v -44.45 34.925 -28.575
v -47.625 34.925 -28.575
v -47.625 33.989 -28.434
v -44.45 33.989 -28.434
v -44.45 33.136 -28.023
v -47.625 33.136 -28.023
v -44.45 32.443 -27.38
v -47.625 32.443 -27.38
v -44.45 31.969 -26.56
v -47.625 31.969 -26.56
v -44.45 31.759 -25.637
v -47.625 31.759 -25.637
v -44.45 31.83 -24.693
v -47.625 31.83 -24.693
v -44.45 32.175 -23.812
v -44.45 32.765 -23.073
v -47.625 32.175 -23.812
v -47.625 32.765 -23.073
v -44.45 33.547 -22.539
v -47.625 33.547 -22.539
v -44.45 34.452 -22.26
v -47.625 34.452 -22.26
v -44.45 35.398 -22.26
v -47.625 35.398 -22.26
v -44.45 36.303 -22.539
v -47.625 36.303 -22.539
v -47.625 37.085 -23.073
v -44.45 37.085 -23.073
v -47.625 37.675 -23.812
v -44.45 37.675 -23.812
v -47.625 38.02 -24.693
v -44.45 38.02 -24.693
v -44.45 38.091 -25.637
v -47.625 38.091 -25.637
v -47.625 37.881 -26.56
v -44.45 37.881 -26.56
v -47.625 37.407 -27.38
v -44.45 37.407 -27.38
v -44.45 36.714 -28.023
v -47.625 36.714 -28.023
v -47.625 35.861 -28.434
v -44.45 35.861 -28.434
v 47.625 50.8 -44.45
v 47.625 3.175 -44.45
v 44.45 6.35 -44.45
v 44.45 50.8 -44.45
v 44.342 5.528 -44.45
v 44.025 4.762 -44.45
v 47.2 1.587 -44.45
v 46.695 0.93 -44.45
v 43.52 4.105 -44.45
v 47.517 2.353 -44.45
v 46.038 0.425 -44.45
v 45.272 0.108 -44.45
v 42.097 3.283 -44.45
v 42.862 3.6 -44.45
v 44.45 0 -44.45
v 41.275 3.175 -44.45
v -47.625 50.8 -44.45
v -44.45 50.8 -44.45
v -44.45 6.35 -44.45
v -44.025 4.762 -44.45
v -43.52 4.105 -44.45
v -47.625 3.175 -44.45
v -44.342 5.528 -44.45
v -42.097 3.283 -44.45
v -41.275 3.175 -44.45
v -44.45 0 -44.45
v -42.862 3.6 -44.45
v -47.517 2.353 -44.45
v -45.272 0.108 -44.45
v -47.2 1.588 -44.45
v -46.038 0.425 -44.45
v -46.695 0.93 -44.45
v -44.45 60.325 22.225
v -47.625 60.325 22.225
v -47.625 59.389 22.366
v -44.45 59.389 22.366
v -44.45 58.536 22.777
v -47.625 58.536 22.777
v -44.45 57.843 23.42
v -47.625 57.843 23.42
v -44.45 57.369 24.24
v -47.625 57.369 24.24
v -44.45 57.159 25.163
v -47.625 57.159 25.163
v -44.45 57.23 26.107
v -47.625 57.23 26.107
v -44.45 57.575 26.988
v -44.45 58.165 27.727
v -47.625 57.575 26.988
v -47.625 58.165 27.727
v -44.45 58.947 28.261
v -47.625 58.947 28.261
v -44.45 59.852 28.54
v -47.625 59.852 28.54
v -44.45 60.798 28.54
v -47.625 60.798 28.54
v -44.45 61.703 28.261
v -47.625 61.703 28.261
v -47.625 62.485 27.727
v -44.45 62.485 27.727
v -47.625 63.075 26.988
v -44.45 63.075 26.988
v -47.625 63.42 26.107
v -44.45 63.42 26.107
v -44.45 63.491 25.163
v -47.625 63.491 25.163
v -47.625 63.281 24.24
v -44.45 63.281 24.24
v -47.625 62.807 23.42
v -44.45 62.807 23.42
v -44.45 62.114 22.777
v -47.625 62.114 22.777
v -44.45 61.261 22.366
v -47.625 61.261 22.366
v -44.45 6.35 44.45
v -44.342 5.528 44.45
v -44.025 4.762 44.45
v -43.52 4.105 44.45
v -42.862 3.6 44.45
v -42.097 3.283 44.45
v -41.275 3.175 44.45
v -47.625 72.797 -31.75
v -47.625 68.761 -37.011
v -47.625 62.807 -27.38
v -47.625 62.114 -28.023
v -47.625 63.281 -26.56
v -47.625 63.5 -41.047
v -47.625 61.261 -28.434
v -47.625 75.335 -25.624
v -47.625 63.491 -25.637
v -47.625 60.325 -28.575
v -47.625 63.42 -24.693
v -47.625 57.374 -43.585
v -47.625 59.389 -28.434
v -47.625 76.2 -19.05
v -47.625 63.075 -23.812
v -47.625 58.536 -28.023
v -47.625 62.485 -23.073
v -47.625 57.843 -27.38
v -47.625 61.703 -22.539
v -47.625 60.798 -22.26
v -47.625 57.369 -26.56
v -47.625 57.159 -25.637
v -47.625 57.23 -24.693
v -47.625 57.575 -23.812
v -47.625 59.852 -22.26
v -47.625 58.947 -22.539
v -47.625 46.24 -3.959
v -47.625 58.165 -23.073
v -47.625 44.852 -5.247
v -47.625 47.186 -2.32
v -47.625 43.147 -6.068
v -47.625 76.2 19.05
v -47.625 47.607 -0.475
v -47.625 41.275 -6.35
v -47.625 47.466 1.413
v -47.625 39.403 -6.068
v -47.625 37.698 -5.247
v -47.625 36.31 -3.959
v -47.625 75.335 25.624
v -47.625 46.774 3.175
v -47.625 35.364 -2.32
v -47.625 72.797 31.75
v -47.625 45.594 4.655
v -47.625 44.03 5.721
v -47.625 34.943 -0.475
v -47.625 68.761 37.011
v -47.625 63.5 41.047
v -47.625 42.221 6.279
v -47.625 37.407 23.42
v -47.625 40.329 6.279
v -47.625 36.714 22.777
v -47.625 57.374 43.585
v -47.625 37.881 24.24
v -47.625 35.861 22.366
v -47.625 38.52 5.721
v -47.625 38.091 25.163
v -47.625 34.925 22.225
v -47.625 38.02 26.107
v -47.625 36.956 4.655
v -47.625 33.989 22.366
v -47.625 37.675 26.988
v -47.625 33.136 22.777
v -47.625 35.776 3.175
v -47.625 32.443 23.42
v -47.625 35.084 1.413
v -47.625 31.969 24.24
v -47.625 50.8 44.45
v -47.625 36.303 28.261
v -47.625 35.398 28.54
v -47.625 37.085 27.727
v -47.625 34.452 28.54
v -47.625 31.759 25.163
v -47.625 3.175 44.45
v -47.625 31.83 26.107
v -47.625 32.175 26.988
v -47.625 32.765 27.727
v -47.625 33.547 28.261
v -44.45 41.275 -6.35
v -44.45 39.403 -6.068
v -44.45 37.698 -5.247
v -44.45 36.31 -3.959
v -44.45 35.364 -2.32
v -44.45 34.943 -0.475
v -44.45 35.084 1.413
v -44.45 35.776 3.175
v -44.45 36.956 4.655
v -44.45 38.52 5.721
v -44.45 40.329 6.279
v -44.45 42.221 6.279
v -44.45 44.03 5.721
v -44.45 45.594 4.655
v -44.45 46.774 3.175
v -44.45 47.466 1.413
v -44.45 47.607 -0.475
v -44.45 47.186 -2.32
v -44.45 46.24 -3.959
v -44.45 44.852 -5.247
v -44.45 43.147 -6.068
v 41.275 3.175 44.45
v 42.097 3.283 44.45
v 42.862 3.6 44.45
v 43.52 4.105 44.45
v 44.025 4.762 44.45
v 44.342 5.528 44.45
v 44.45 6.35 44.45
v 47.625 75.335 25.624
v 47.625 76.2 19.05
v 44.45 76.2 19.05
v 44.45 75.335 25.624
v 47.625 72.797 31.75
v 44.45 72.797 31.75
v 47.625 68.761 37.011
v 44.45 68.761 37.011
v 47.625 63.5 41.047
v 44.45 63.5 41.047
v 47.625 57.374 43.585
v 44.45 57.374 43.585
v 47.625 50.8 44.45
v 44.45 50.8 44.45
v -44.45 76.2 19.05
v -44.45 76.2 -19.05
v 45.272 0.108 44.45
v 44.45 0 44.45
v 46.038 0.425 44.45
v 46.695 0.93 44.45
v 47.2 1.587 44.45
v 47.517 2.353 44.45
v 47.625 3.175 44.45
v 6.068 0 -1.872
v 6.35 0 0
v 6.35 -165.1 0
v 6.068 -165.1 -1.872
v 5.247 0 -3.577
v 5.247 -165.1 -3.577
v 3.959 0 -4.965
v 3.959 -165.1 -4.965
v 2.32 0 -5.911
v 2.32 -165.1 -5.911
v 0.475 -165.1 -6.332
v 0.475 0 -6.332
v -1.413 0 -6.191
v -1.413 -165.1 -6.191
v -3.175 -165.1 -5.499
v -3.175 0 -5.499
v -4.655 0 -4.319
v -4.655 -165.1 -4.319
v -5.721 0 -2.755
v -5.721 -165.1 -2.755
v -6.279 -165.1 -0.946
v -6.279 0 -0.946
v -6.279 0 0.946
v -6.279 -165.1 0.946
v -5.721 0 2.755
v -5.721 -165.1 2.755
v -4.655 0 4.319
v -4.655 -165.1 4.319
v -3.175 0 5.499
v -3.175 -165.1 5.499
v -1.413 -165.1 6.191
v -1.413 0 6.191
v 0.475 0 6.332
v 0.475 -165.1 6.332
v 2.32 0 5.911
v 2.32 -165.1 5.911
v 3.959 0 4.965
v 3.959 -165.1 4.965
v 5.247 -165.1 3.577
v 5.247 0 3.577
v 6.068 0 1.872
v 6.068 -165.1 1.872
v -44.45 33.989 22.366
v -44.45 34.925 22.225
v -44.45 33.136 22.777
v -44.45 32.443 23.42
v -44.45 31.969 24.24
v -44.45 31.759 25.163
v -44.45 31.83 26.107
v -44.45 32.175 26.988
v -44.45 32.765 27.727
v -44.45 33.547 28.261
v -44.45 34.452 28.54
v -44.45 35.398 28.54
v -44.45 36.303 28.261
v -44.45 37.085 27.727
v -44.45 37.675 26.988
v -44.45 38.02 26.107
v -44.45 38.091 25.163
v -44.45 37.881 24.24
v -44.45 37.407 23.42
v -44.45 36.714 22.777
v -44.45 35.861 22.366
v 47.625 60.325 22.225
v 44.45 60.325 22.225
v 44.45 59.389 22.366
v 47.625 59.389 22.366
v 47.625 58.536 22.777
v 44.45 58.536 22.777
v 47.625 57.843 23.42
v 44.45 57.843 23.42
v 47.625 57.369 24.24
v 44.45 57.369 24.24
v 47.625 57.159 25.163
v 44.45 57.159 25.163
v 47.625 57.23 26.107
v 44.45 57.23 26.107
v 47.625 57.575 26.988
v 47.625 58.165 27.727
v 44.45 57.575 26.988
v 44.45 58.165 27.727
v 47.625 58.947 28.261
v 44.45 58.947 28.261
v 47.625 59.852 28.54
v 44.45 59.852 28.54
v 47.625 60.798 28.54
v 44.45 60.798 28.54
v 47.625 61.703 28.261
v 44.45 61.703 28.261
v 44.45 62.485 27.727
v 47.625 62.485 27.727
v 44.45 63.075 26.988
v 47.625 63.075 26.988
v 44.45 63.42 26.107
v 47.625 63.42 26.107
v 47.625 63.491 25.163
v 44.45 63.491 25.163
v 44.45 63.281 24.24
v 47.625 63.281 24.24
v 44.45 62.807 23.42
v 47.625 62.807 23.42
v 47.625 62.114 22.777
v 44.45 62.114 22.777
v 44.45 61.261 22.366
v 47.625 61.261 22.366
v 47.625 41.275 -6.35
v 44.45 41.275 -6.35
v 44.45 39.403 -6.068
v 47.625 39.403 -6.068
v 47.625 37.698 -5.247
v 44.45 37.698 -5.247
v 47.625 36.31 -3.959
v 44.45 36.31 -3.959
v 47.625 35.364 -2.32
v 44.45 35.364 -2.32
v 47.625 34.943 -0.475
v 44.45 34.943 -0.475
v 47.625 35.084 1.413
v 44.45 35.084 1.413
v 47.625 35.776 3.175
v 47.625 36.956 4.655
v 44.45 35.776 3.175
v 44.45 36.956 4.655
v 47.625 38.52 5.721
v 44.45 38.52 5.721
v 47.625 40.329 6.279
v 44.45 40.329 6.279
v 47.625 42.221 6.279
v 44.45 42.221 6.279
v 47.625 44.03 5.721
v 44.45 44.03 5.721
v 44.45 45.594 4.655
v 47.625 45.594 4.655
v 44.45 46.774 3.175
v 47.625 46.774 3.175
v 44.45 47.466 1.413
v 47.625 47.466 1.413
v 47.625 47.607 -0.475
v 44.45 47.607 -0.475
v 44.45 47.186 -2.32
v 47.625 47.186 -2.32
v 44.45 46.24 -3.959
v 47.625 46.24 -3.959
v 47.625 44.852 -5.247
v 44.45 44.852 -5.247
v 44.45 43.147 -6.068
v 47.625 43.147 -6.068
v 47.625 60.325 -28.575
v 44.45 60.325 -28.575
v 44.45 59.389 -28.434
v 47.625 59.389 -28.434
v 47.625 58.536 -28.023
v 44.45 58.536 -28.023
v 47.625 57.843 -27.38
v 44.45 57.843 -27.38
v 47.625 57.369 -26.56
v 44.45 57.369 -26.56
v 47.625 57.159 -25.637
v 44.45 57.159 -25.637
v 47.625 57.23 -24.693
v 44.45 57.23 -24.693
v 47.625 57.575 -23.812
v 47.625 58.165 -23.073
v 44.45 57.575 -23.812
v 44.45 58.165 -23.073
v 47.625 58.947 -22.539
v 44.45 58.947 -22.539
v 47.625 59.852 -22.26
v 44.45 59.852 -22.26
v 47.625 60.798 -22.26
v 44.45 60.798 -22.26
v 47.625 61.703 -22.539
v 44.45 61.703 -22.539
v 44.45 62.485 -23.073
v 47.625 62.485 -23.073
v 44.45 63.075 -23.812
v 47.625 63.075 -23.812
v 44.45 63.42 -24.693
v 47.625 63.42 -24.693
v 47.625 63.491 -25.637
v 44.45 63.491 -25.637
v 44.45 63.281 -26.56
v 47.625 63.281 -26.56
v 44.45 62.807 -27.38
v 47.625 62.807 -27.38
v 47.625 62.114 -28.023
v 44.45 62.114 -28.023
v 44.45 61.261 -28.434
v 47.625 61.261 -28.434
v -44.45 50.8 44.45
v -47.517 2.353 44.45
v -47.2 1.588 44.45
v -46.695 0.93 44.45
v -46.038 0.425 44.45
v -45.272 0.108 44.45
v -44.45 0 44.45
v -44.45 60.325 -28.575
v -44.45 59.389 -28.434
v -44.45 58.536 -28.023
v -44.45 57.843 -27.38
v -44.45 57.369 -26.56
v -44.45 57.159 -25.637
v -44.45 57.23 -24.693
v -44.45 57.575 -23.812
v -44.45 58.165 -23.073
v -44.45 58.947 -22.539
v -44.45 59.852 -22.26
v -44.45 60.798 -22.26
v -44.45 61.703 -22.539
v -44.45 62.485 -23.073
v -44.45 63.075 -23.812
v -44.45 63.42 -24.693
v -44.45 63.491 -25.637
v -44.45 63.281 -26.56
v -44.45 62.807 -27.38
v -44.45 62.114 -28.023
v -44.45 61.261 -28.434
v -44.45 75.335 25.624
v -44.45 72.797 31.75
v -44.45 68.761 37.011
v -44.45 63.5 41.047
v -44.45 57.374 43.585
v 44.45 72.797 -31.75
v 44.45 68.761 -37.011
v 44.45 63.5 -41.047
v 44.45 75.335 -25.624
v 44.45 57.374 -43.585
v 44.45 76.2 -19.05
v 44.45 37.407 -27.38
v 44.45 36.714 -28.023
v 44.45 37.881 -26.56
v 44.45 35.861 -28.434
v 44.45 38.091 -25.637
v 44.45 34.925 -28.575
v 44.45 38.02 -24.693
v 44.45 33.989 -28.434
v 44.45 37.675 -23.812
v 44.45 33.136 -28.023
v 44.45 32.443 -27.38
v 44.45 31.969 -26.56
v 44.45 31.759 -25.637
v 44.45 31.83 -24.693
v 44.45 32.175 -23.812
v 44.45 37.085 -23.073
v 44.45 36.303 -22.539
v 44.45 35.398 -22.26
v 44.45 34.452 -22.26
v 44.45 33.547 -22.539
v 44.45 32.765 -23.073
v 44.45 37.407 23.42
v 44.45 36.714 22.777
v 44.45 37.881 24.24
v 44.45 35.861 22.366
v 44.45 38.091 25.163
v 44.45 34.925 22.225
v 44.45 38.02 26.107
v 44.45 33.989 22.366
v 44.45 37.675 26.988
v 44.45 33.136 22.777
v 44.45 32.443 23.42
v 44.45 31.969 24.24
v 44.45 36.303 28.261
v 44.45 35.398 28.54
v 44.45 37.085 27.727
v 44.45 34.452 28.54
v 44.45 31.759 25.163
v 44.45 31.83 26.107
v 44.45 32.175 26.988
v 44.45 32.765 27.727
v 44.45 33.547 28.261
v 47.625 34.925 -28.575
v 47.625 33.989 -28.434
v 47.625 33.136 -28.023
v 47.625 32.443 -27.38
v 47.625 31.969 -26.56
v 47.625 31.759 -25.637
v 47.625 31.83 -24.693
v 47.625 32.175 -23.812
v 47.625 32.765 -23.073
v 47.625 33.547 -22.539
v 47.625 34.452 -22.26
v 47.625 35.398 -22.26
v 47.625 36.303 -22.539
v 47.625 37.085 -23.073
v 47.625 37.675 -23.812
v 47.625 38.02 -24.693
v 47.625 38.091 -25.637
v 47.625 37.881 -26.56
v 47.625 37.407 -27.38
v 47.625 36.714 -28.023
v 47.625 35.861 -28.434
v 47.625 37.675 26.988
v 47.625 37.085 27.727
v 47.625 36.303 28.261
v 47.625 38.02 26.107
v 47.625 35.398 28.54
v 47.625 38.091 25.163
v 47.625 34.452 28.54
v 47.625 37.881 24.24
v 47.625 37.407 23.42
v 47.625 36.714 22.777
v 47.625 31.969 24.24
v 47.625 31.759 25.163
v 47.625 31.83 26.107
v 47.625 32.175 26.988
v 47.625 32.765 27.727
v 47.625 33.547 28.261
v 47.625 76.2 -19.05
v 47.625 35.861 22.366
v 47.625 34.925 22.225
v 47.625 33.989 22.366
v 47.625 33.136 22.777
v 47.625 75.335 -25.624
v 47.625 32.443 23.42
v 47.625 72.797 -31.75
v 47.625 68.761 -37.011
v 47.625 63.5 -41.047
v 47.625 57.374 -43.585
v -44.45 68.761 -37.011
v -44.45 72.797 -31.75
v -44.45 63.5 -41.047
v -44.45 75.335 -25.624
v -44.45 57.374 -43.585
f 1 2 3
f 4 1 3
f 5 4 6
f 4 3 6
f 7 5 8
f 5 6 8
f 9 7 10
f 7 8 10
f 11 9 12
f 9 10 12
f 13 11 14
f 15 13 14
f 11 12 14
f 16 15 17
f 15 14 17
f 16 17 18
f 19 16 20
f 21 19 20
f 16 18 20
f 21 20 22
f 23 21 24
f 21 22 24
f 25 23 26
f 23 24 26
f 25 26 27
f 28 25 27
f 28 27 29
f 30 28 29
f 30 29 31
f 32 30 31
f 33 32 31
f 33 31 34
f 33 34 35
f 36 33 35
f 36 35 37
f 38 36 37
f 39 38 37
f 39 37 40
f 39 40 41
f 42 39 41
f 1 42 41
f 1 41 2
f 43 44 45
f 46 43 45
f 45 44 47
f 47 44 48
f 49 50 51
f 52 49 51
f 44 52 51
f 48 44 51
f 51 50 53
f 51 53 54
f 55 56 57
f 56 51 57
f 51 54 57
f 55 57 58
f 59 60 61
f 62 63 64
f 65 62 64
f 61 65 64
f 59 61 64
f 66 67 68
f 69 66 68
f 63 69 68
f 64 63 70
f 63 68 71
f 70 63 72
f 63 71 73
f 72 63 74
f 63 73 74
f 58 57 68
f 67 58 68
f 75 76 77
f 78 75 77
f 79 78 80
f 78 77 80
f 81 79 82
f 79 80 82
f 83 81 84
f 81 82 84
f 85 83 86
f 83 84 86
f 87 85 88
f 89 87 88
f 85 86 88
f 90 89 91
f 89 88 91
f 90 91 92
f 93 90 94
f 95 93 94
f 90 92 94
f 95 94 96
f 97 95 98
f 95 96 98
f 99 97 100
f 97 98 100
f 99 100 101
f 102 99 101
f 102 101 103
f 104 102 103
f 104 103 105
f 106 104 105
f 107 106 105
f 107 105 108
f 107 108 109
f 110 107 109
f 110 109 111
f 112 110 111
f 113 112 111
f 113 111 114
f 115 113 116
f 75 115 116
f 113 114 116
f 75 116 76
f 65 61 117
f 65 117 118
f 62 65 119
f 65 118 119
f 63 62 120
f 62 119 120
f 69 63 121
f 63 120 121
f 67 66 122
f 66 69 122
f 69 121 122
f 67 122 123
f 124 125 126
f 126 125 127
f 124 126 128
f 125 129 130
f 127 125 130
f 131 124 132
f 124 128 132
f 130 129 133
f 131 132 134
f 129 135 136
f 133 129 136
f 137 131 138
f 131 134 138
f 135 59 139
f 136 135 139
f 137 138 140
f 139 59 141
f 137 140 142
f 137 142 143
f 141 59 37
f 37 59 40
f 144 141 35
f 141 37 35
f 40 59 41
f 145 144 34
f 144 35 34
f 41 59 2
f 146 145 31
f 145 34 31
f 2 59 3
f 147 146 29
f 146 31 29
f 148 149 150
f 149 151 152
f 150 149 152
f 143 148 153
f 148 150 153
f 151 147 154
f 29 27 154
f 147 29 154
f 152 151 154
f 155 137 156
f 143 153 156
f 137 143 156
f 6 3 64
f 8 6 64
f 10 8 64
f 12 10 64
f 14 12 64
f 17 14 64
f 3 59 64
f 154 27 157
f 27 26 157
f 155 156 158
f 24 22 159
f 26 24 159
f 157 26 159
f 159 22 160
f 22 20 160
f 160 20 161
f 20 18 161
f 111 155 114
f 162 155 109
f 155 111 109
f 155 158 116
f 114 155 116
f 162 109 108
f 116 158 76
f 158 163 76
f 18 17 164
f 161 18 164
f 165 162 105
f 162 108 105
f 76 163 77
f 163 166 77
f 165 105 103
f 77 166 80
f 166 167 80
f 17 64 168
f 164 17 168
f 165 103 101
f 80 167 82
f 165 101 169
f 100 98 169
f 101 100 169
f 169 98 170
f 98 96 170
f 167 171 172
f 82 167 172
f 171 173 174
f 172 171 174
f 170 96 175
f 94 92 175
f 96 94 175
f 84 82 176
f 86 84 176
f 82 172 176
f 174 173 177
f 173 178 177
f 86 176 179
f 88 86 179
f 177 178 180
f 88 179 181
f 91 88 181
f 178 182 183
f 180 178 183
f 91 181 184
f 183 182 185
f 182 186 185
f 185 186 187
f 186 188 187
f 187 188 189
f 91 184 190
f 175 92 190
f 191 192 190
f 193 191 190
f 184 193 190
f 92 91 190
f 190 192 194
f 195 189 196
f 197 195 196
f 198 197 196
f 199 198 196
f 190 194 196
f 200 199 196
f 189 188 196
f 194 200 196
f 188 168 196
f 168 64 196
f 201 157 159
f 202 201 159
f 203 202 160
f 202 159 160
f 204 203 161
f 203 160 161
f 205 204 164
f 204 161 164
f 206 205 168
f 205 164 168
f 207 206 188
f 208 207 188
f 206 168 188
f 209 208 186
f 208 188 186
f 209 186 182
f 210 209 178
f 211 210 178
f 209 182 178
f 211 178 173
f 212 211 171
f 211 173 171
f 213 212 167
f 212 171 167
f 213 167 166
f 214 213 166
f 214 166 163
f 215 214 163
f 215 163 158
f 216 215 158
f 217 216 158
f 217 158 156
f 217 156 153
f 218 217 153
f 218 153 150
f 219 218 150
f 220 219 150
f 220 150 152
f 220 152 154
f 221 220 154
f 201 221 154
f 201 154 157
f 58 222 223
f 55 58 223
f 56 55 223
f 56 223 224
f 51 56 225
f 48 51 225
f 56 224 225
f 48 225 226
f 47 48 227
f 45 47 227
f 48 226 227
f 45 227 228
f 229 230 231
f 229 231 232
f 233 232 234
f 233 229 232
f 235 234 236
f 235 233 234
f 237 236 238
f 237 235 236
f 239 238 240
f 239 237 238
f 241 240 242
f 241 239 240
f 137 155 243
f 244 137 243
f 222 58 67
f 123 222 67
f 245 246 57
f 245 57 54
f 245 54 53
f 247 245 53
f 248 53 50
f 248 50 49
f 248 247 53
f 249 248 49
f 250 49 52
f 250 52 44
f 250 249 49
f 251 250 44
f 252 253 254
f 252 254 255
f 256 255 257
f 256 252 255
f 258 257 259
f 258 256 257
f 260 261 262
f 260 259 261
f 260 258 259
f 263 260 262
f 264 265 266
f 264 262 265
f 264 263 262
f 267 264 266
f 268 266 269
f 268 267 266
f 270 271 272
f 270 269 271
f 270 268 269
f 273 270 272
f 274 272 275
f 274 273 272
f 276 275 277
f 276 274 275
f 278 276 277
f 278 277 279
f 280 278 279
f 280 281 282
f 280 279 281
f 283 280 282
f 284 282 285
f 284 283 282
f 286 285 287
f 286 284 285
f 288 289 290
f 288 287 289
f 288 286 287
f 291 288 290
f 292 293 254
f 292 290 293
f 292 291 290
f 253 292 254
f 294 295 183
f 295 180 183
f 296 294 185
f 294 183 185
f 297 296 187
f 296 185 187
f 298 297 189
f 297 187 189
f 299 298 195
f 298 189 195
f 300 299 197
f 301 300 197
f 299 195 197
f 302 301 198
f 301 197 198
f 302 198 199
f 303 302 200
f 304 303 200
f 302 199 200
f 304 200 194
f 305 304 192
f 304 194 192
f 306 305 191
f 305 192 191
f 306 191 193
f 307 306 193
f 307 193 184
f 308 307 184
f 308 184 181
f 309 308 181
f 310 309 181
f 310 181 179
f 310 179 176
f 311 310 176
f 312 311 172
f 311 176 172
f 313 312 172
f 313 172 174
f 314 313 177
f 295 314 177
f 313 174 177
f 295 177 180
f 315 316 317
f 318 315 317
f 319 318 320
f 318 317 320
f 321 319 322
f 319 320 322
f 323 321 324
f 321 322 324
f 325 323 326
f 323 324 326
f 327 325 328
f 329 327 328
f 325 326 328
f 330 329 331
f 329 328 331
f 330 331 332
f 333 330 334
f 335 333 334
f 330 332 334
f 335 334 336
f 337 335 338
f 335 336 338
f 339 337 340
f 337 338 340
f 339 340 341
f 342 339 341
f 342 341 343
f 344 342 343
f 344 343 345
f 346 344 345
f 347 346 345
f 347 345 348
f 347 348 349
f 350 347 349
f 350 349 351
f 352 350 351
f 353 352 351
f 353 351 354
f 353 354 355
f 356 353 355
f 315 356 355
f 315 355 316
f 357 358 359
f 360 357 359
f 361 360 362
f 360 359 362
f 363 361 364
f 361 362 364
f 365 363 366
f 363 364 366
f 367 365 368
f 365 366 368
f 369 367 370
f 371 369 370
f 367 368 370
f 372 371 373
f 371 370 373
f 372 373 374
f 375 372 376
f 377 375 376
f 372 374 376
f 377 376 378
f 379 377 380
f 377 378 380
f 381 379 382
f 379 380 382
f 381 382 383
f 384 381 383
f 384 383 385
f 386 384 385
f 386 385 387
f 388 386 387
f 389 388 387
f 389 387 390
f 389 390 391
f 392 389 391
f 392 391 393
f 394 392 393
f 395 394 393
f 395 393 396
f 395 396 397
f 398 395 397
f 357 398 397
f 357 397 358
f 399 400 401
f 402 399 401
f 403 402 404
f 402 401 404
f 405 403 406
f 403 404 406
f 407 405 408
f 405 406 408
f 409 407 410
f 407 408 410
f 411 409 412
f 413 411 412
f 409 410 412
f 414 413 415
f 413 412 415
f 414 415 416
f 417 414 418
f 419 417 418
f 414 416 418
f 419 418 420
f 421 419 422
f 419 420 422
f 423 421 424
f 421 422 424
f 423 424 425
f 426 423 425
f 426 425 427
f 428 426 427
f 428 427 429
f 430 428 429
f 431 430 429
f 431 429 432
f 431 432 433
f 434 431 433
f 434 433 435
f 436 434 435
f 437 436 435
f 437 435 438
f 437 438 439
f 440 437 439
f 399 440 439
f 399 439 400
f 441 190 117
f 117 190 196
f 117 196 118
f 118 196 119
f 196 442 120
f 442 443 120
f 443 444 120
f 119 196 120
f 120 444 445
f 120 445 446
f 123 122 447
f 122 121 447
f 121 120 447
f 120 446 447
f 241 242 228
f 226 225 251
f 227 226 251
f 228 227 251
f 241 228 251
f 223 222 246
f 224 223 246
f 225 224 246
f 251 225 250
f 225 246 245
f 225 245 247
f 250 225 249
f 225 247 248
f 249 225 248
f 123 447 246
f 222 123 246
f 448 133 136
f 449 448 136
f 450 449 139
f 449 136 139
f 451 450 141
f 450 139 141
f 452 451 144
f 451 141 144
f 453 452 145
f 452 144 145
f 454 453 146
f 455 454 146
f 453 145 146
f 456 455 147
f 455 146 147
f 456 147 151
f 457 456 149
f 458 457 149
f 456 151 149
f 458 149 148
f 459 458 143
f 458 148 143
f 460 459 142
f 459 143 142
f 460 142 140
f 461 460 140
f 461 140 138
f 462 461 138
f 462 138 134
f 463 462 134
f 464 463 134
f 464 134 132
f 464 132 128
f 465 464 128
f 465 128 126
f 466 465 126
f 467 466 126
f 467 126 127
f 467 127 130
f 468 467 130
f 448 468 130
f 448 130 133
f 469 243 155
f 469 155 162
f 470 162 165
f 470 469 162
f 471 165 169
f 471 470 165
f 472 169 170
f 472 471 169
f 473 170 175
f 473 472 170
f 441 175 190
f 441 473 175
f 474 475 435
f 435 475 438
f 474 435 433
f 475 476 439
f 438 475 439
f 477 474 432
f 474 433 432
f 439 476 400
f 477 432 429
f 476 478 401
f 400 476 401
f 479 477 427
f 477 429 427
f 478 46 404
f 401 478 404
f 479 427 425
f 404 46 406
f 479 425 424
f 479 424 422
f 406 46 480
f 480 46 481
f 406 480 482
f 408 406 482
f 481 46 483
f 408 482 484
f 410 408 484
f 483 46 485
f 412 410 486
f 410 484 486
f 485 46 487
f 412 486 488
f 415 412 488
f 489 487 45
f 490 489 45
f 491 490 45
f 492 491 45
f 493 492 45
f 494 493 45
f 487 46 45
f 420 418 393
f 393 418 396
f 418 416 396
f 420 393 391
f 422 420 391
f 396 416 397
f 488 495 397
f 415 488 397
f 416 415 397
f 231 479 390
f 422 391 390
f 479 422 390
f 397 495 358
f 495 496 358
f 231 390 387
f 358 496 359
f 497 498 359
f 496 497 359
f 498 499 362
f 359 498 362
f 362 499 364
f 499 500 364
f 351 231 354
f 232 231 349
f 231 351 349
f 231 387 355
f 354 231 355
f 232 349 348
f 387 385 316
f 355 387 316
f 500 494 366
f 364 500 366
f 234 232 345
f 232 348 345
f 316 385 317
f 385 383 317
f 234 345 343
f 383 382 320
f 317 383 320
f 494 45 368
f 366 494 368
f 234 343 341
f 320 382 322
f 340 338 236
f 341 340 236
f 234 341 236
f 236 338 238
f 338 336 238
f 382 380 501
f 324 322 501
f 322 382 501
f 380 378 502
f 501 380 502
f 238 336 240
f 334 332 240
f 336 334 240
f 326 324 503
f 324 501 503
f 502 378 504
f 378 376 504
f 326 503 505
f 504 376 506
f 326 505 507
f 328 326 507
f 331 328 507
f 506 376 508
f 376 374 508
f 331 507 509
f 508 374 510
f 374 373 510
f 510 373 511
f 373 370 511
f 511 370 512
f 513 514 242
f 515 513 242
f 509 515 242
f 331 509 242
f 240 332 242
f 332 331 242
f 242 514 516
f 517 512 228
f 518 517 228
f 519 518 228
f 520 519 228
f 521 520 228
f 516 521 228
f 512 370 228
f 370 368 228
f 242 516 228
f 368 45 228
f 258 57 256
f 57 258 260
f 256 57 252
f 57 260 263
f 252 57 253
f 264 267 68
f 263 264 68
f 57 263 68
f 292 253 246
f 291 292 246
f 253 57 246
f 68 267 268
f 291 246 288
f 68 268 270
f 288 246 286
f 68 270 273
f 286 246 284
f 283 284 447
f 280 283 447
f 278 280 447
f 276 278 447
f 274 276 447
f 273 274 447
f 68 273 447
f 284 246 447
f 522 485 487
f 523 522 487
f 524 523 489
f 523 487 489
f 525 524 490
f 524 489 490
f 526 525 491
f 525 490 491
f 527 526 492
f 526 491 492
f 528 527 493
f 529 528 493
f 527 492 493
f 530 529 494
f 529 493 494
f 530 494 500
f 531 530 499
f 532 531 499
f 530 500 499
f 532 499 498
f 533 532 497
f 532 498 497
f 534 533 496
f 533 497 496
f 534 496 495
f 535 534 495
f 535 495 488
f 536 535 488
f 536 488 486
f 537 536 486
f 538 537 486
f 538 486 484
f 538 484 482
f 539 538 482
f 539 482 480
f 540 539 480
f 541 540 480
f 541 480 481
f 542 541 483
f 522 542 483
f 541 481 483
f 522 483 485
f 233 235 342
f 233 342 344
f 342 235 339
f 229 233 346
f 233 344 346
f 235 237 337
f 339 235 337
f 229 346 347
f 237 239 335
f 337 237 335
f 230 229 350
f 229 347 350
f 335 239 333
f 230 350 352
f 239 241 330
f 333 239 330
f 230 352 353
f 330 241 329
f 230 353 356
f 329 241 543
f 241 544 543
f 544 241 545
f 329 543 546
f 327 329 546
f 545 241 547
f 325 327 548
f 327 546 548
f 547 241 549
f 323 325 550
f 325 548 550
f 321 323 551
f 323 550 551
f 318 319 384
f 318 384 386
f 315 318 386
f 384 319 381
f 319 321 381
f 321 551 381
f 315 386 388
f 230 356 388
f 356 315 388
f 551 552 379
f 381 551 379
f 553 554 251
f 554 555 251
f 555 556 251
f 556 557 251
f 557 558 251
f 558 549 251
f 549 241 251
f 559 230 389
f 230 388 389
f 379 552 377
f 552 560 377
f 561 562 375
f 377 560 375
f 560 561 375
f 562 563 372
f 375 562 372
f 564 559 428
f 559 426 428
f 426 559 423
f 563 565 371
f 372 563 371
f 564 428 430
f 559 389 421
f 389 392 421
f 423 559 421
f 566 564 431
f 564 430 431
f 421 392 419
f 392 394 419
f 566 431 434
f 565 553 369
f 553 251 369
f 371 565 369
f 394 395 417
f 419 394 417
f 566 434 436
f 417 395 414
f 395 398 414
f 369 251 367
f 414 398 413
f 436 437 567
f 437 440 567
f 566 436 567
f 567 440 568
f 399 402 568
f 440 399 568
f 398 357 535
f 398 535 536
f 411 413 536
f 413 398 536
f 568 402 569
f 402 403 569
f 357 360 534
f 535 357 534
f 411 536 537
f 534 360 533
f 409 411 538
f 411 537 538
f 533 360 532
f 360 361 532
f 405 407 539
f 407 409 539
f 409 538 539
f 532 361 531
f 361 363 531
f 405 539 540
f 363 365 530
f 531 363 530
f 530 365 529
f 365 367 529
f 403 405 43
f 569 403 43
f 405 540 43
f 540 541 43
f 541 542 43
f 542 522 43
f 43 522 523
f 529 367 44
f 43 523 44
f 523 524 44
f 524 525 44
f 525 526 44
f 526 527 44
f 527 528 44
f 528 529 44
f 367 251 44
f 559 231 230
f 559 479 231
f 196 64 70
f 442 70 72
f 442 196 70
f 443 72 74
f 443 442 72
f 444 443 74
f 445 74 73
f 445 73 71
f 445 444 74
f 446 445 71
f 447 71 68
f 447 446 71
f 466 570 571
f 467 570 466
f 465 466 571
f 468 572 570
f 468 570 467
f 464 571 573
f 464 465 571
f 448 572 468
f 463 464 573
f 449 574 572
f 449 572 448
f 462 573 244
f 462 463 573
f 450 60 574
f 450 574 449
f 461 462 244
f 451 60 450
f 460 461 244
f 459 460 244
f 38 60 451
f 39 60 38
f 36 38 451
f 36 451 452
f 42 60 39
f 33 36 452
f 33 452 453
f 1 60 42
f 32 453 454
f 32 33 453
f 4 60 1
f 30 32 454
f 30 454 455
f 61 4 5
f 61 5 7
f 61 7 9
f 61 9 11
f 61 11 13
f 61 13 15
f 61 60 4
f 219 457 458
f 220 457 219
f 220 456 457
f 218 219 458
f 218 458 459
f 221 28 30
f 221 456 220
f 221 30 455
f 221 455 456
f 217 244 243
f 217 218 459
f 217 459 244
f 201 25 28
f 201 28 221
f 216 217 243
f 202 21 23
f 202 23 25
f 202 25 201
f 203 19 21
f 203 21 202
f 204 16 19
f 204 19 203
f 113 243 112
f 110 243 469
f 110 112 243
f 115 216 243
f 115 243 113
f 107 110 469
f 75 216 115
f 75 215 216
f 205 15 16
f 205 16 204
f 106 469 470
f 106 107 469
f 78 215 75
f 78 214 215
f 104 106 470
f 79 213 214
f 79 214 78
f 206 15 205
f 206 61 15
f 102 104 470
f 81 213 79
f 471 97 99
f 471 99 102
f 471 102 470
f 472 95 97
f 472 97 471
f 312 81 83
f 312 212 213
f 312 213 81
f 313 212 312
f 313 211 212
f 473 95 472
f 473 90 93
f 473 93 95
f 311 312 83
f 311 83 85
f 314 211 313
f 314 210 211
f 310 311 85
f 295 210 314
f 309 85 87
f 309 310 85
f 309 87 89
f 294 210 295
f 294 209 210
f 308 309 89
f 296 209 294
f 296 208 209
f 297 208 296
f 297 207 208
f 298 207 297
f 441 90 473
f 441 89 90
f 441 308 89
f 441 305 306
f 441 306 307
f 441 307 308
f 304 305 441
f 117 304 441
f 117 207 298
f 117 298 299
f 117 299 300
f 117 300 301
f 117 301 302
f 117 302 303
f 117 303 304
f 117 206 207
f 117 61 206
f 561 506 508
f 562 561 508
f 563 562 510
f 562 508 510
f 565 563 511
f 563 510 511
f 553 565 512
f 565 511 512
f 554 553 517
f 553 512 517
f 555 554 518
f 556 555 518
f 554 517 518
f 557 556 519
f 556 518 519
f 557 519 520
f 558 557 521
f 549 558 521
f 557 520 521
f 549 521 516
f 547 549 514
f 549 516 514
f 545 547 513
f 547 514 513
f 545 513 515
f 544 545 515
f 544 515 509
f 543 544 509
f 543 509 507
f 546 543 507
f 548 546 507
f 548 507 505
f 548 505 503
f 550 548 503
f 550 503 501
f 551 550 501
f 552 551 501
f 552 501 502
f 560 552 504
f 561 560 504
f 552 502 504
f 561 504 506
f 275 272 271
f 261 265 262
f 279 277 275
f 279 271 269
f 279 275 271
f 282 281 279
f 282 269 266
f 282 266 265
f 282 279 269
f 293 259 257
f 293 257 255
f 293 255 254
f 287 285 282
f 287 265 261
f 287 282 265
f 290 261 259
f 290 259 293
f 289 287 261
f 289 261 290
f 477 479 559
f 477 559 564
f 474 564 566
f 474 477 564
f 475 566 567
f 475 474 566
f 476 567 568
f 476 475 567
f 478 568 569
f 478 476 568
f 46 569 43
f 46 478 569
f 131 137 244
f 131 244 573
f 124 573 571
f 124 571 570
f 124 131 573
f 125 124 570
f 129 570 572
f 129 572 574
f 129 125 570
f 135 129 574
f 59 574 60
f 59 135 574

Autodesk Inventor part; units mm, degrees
ref_plane "YZ Plane" through (0, 0, 0) normal (1, 0, 0) x (0, 1, 0)
ref_plane "XZ Plane" through (0, 0, 0) normal (0, 1, 0) x (-1, 0, 0)
ref_plane "XY Plane" through (0, 0, 0) normal (0, 0, 1) x (1, 0, 0)
sketch "Sketch1" plane through (0, 0, 0) normal (0, 1, 0) x (-1, 0, 0)
  line L0 (47.625, 44.45) -> (-47.625, 44.45)
  line L1 (-47.625, 44.45) -> (-47.625, -44.45)
  line L2 (-47.625, -44.45) -> (47.625, -44.45)
  line L3 (47.625, -44.45) -> (47.625, 44.45)
  line L4 (47.625, 0) -> (-47.625, 0)
  line L5 (0, -44.45) -> (0, 44.45)
  point P0 (0, 0)
  point P1 (0, 0)
  dimension "d0" = 95.25
  dimension "d1" = 88.9
extrude "Extrusion1" add sketch "Sketch1" along normal blind 3.175
sketch "Sketch2" plane through (0, 3.175, 0) normal (0, 1, 0) x (1, 0, 0)
  line L0 (47.625, 44.45) -> (-47.625, 44.45) projected
  line L1 (-47.625, -44.45) -> (47.625, -44.45) projected
  line L2 (47.625, 44.45) -> (44.45, 44.45)
  line L3 (44.45, 44.45) -> (44.45, -44.45)
  line L4 (44.45, -44.45) -> (47.625, -44.45)
  line L5 (47.625, -44.45) -> (47.625, 44.45)
  line L6 (-47.625, 44.45) -> (-47.625, -44.45) projected
  line L7 (-47.625, 44.45) -> (-44.45, 44.45)
  line L8 (-44.45, 44.45) -> (-44.45, -44.45)
  line L9 (-44.45, -44.45) -> (-47.625, -44.45)
  line L10 (-47.625, -44.45) -> (-47.625, 44.45)
  point P0 (0, 0)
  point P1 (-44.45, -44.45)
  point P2 (-44.45, 44.45)
  dimension "d4" = 3.175
extrude "Extrusion2" add sketch "Sketch2" along normal blind 73.025 contours L5 L1 L3 L0 | L8 L1 L6 L0
fillet "Fillet1" radius 3.175 4 edges at (47.625, 0, 0) (44.45, 3.175, 0) (-47.625, 0, 0) (-44.45, 3.175, 0)
fillet "Fillet2" radius 25.4 4 edges at (46.0375, 76.2, -44.45) (-46.0375, 76.2, -44.45) (-46.0375, 76.2, 44.45) (46.0375, 76.2, 44.45)
sketch "Sketch3" plane through (47.625, 3.175, 44.45) normal (1, 0, 0) x (0, 0, -1)
  circle A0 centre (69.85, 57.15) radius 3.175
  circle A1 centre (69.85, 31.75) radius 3.175
  line L0 (88.9, 0) -> (88.9, 47.625) projected
  line L1 (44.45, -3.175) -> (44.45, 73.025)
  line L2 (25.4, 73.025) -> (63.5, 73.025) projected
  circle A2 centre (19.05, 57.15) radius 3.175
  circle A3 centre (19.05, 31.75) radius 3.175
  circle A4 centre (44.45, 38.1) radius 6.35
  dimension "d10" = 6.35
  dimension "d11" = 19.05
  dimension "d12" = 15.875
  dimension "d13" = 25.4
  dimension "d14" = 19.05
  dimension "d15" = 12.7
  dimension "d16" = 6.35
hole "Hole1" at (47.625, 60.325, 25.4) at (47.625, 60.325, -25.4) at (47.625, 34.925, 25.4) at (47.625, 34.925, -25.4) direction (-1, 0, 0) diameter 6.35 end through all
hole "Hole2" at (47.625, 41.275, 0) direction (-1, 0, 0) diameter 12.7 end through all
sketch "Sketch4" plane through (0, 0, 0) normal (0, -1, 0) x (1, 0, 0)
  circle A0 centre (0, 0) radius 6.35
  dimension "d31" = 12.7
extrude "Extrusion3" add sketch "Sketch4" along normal blind 165.1
properties part number "Saddle_Bracket" material "Steel, Galvanized"
